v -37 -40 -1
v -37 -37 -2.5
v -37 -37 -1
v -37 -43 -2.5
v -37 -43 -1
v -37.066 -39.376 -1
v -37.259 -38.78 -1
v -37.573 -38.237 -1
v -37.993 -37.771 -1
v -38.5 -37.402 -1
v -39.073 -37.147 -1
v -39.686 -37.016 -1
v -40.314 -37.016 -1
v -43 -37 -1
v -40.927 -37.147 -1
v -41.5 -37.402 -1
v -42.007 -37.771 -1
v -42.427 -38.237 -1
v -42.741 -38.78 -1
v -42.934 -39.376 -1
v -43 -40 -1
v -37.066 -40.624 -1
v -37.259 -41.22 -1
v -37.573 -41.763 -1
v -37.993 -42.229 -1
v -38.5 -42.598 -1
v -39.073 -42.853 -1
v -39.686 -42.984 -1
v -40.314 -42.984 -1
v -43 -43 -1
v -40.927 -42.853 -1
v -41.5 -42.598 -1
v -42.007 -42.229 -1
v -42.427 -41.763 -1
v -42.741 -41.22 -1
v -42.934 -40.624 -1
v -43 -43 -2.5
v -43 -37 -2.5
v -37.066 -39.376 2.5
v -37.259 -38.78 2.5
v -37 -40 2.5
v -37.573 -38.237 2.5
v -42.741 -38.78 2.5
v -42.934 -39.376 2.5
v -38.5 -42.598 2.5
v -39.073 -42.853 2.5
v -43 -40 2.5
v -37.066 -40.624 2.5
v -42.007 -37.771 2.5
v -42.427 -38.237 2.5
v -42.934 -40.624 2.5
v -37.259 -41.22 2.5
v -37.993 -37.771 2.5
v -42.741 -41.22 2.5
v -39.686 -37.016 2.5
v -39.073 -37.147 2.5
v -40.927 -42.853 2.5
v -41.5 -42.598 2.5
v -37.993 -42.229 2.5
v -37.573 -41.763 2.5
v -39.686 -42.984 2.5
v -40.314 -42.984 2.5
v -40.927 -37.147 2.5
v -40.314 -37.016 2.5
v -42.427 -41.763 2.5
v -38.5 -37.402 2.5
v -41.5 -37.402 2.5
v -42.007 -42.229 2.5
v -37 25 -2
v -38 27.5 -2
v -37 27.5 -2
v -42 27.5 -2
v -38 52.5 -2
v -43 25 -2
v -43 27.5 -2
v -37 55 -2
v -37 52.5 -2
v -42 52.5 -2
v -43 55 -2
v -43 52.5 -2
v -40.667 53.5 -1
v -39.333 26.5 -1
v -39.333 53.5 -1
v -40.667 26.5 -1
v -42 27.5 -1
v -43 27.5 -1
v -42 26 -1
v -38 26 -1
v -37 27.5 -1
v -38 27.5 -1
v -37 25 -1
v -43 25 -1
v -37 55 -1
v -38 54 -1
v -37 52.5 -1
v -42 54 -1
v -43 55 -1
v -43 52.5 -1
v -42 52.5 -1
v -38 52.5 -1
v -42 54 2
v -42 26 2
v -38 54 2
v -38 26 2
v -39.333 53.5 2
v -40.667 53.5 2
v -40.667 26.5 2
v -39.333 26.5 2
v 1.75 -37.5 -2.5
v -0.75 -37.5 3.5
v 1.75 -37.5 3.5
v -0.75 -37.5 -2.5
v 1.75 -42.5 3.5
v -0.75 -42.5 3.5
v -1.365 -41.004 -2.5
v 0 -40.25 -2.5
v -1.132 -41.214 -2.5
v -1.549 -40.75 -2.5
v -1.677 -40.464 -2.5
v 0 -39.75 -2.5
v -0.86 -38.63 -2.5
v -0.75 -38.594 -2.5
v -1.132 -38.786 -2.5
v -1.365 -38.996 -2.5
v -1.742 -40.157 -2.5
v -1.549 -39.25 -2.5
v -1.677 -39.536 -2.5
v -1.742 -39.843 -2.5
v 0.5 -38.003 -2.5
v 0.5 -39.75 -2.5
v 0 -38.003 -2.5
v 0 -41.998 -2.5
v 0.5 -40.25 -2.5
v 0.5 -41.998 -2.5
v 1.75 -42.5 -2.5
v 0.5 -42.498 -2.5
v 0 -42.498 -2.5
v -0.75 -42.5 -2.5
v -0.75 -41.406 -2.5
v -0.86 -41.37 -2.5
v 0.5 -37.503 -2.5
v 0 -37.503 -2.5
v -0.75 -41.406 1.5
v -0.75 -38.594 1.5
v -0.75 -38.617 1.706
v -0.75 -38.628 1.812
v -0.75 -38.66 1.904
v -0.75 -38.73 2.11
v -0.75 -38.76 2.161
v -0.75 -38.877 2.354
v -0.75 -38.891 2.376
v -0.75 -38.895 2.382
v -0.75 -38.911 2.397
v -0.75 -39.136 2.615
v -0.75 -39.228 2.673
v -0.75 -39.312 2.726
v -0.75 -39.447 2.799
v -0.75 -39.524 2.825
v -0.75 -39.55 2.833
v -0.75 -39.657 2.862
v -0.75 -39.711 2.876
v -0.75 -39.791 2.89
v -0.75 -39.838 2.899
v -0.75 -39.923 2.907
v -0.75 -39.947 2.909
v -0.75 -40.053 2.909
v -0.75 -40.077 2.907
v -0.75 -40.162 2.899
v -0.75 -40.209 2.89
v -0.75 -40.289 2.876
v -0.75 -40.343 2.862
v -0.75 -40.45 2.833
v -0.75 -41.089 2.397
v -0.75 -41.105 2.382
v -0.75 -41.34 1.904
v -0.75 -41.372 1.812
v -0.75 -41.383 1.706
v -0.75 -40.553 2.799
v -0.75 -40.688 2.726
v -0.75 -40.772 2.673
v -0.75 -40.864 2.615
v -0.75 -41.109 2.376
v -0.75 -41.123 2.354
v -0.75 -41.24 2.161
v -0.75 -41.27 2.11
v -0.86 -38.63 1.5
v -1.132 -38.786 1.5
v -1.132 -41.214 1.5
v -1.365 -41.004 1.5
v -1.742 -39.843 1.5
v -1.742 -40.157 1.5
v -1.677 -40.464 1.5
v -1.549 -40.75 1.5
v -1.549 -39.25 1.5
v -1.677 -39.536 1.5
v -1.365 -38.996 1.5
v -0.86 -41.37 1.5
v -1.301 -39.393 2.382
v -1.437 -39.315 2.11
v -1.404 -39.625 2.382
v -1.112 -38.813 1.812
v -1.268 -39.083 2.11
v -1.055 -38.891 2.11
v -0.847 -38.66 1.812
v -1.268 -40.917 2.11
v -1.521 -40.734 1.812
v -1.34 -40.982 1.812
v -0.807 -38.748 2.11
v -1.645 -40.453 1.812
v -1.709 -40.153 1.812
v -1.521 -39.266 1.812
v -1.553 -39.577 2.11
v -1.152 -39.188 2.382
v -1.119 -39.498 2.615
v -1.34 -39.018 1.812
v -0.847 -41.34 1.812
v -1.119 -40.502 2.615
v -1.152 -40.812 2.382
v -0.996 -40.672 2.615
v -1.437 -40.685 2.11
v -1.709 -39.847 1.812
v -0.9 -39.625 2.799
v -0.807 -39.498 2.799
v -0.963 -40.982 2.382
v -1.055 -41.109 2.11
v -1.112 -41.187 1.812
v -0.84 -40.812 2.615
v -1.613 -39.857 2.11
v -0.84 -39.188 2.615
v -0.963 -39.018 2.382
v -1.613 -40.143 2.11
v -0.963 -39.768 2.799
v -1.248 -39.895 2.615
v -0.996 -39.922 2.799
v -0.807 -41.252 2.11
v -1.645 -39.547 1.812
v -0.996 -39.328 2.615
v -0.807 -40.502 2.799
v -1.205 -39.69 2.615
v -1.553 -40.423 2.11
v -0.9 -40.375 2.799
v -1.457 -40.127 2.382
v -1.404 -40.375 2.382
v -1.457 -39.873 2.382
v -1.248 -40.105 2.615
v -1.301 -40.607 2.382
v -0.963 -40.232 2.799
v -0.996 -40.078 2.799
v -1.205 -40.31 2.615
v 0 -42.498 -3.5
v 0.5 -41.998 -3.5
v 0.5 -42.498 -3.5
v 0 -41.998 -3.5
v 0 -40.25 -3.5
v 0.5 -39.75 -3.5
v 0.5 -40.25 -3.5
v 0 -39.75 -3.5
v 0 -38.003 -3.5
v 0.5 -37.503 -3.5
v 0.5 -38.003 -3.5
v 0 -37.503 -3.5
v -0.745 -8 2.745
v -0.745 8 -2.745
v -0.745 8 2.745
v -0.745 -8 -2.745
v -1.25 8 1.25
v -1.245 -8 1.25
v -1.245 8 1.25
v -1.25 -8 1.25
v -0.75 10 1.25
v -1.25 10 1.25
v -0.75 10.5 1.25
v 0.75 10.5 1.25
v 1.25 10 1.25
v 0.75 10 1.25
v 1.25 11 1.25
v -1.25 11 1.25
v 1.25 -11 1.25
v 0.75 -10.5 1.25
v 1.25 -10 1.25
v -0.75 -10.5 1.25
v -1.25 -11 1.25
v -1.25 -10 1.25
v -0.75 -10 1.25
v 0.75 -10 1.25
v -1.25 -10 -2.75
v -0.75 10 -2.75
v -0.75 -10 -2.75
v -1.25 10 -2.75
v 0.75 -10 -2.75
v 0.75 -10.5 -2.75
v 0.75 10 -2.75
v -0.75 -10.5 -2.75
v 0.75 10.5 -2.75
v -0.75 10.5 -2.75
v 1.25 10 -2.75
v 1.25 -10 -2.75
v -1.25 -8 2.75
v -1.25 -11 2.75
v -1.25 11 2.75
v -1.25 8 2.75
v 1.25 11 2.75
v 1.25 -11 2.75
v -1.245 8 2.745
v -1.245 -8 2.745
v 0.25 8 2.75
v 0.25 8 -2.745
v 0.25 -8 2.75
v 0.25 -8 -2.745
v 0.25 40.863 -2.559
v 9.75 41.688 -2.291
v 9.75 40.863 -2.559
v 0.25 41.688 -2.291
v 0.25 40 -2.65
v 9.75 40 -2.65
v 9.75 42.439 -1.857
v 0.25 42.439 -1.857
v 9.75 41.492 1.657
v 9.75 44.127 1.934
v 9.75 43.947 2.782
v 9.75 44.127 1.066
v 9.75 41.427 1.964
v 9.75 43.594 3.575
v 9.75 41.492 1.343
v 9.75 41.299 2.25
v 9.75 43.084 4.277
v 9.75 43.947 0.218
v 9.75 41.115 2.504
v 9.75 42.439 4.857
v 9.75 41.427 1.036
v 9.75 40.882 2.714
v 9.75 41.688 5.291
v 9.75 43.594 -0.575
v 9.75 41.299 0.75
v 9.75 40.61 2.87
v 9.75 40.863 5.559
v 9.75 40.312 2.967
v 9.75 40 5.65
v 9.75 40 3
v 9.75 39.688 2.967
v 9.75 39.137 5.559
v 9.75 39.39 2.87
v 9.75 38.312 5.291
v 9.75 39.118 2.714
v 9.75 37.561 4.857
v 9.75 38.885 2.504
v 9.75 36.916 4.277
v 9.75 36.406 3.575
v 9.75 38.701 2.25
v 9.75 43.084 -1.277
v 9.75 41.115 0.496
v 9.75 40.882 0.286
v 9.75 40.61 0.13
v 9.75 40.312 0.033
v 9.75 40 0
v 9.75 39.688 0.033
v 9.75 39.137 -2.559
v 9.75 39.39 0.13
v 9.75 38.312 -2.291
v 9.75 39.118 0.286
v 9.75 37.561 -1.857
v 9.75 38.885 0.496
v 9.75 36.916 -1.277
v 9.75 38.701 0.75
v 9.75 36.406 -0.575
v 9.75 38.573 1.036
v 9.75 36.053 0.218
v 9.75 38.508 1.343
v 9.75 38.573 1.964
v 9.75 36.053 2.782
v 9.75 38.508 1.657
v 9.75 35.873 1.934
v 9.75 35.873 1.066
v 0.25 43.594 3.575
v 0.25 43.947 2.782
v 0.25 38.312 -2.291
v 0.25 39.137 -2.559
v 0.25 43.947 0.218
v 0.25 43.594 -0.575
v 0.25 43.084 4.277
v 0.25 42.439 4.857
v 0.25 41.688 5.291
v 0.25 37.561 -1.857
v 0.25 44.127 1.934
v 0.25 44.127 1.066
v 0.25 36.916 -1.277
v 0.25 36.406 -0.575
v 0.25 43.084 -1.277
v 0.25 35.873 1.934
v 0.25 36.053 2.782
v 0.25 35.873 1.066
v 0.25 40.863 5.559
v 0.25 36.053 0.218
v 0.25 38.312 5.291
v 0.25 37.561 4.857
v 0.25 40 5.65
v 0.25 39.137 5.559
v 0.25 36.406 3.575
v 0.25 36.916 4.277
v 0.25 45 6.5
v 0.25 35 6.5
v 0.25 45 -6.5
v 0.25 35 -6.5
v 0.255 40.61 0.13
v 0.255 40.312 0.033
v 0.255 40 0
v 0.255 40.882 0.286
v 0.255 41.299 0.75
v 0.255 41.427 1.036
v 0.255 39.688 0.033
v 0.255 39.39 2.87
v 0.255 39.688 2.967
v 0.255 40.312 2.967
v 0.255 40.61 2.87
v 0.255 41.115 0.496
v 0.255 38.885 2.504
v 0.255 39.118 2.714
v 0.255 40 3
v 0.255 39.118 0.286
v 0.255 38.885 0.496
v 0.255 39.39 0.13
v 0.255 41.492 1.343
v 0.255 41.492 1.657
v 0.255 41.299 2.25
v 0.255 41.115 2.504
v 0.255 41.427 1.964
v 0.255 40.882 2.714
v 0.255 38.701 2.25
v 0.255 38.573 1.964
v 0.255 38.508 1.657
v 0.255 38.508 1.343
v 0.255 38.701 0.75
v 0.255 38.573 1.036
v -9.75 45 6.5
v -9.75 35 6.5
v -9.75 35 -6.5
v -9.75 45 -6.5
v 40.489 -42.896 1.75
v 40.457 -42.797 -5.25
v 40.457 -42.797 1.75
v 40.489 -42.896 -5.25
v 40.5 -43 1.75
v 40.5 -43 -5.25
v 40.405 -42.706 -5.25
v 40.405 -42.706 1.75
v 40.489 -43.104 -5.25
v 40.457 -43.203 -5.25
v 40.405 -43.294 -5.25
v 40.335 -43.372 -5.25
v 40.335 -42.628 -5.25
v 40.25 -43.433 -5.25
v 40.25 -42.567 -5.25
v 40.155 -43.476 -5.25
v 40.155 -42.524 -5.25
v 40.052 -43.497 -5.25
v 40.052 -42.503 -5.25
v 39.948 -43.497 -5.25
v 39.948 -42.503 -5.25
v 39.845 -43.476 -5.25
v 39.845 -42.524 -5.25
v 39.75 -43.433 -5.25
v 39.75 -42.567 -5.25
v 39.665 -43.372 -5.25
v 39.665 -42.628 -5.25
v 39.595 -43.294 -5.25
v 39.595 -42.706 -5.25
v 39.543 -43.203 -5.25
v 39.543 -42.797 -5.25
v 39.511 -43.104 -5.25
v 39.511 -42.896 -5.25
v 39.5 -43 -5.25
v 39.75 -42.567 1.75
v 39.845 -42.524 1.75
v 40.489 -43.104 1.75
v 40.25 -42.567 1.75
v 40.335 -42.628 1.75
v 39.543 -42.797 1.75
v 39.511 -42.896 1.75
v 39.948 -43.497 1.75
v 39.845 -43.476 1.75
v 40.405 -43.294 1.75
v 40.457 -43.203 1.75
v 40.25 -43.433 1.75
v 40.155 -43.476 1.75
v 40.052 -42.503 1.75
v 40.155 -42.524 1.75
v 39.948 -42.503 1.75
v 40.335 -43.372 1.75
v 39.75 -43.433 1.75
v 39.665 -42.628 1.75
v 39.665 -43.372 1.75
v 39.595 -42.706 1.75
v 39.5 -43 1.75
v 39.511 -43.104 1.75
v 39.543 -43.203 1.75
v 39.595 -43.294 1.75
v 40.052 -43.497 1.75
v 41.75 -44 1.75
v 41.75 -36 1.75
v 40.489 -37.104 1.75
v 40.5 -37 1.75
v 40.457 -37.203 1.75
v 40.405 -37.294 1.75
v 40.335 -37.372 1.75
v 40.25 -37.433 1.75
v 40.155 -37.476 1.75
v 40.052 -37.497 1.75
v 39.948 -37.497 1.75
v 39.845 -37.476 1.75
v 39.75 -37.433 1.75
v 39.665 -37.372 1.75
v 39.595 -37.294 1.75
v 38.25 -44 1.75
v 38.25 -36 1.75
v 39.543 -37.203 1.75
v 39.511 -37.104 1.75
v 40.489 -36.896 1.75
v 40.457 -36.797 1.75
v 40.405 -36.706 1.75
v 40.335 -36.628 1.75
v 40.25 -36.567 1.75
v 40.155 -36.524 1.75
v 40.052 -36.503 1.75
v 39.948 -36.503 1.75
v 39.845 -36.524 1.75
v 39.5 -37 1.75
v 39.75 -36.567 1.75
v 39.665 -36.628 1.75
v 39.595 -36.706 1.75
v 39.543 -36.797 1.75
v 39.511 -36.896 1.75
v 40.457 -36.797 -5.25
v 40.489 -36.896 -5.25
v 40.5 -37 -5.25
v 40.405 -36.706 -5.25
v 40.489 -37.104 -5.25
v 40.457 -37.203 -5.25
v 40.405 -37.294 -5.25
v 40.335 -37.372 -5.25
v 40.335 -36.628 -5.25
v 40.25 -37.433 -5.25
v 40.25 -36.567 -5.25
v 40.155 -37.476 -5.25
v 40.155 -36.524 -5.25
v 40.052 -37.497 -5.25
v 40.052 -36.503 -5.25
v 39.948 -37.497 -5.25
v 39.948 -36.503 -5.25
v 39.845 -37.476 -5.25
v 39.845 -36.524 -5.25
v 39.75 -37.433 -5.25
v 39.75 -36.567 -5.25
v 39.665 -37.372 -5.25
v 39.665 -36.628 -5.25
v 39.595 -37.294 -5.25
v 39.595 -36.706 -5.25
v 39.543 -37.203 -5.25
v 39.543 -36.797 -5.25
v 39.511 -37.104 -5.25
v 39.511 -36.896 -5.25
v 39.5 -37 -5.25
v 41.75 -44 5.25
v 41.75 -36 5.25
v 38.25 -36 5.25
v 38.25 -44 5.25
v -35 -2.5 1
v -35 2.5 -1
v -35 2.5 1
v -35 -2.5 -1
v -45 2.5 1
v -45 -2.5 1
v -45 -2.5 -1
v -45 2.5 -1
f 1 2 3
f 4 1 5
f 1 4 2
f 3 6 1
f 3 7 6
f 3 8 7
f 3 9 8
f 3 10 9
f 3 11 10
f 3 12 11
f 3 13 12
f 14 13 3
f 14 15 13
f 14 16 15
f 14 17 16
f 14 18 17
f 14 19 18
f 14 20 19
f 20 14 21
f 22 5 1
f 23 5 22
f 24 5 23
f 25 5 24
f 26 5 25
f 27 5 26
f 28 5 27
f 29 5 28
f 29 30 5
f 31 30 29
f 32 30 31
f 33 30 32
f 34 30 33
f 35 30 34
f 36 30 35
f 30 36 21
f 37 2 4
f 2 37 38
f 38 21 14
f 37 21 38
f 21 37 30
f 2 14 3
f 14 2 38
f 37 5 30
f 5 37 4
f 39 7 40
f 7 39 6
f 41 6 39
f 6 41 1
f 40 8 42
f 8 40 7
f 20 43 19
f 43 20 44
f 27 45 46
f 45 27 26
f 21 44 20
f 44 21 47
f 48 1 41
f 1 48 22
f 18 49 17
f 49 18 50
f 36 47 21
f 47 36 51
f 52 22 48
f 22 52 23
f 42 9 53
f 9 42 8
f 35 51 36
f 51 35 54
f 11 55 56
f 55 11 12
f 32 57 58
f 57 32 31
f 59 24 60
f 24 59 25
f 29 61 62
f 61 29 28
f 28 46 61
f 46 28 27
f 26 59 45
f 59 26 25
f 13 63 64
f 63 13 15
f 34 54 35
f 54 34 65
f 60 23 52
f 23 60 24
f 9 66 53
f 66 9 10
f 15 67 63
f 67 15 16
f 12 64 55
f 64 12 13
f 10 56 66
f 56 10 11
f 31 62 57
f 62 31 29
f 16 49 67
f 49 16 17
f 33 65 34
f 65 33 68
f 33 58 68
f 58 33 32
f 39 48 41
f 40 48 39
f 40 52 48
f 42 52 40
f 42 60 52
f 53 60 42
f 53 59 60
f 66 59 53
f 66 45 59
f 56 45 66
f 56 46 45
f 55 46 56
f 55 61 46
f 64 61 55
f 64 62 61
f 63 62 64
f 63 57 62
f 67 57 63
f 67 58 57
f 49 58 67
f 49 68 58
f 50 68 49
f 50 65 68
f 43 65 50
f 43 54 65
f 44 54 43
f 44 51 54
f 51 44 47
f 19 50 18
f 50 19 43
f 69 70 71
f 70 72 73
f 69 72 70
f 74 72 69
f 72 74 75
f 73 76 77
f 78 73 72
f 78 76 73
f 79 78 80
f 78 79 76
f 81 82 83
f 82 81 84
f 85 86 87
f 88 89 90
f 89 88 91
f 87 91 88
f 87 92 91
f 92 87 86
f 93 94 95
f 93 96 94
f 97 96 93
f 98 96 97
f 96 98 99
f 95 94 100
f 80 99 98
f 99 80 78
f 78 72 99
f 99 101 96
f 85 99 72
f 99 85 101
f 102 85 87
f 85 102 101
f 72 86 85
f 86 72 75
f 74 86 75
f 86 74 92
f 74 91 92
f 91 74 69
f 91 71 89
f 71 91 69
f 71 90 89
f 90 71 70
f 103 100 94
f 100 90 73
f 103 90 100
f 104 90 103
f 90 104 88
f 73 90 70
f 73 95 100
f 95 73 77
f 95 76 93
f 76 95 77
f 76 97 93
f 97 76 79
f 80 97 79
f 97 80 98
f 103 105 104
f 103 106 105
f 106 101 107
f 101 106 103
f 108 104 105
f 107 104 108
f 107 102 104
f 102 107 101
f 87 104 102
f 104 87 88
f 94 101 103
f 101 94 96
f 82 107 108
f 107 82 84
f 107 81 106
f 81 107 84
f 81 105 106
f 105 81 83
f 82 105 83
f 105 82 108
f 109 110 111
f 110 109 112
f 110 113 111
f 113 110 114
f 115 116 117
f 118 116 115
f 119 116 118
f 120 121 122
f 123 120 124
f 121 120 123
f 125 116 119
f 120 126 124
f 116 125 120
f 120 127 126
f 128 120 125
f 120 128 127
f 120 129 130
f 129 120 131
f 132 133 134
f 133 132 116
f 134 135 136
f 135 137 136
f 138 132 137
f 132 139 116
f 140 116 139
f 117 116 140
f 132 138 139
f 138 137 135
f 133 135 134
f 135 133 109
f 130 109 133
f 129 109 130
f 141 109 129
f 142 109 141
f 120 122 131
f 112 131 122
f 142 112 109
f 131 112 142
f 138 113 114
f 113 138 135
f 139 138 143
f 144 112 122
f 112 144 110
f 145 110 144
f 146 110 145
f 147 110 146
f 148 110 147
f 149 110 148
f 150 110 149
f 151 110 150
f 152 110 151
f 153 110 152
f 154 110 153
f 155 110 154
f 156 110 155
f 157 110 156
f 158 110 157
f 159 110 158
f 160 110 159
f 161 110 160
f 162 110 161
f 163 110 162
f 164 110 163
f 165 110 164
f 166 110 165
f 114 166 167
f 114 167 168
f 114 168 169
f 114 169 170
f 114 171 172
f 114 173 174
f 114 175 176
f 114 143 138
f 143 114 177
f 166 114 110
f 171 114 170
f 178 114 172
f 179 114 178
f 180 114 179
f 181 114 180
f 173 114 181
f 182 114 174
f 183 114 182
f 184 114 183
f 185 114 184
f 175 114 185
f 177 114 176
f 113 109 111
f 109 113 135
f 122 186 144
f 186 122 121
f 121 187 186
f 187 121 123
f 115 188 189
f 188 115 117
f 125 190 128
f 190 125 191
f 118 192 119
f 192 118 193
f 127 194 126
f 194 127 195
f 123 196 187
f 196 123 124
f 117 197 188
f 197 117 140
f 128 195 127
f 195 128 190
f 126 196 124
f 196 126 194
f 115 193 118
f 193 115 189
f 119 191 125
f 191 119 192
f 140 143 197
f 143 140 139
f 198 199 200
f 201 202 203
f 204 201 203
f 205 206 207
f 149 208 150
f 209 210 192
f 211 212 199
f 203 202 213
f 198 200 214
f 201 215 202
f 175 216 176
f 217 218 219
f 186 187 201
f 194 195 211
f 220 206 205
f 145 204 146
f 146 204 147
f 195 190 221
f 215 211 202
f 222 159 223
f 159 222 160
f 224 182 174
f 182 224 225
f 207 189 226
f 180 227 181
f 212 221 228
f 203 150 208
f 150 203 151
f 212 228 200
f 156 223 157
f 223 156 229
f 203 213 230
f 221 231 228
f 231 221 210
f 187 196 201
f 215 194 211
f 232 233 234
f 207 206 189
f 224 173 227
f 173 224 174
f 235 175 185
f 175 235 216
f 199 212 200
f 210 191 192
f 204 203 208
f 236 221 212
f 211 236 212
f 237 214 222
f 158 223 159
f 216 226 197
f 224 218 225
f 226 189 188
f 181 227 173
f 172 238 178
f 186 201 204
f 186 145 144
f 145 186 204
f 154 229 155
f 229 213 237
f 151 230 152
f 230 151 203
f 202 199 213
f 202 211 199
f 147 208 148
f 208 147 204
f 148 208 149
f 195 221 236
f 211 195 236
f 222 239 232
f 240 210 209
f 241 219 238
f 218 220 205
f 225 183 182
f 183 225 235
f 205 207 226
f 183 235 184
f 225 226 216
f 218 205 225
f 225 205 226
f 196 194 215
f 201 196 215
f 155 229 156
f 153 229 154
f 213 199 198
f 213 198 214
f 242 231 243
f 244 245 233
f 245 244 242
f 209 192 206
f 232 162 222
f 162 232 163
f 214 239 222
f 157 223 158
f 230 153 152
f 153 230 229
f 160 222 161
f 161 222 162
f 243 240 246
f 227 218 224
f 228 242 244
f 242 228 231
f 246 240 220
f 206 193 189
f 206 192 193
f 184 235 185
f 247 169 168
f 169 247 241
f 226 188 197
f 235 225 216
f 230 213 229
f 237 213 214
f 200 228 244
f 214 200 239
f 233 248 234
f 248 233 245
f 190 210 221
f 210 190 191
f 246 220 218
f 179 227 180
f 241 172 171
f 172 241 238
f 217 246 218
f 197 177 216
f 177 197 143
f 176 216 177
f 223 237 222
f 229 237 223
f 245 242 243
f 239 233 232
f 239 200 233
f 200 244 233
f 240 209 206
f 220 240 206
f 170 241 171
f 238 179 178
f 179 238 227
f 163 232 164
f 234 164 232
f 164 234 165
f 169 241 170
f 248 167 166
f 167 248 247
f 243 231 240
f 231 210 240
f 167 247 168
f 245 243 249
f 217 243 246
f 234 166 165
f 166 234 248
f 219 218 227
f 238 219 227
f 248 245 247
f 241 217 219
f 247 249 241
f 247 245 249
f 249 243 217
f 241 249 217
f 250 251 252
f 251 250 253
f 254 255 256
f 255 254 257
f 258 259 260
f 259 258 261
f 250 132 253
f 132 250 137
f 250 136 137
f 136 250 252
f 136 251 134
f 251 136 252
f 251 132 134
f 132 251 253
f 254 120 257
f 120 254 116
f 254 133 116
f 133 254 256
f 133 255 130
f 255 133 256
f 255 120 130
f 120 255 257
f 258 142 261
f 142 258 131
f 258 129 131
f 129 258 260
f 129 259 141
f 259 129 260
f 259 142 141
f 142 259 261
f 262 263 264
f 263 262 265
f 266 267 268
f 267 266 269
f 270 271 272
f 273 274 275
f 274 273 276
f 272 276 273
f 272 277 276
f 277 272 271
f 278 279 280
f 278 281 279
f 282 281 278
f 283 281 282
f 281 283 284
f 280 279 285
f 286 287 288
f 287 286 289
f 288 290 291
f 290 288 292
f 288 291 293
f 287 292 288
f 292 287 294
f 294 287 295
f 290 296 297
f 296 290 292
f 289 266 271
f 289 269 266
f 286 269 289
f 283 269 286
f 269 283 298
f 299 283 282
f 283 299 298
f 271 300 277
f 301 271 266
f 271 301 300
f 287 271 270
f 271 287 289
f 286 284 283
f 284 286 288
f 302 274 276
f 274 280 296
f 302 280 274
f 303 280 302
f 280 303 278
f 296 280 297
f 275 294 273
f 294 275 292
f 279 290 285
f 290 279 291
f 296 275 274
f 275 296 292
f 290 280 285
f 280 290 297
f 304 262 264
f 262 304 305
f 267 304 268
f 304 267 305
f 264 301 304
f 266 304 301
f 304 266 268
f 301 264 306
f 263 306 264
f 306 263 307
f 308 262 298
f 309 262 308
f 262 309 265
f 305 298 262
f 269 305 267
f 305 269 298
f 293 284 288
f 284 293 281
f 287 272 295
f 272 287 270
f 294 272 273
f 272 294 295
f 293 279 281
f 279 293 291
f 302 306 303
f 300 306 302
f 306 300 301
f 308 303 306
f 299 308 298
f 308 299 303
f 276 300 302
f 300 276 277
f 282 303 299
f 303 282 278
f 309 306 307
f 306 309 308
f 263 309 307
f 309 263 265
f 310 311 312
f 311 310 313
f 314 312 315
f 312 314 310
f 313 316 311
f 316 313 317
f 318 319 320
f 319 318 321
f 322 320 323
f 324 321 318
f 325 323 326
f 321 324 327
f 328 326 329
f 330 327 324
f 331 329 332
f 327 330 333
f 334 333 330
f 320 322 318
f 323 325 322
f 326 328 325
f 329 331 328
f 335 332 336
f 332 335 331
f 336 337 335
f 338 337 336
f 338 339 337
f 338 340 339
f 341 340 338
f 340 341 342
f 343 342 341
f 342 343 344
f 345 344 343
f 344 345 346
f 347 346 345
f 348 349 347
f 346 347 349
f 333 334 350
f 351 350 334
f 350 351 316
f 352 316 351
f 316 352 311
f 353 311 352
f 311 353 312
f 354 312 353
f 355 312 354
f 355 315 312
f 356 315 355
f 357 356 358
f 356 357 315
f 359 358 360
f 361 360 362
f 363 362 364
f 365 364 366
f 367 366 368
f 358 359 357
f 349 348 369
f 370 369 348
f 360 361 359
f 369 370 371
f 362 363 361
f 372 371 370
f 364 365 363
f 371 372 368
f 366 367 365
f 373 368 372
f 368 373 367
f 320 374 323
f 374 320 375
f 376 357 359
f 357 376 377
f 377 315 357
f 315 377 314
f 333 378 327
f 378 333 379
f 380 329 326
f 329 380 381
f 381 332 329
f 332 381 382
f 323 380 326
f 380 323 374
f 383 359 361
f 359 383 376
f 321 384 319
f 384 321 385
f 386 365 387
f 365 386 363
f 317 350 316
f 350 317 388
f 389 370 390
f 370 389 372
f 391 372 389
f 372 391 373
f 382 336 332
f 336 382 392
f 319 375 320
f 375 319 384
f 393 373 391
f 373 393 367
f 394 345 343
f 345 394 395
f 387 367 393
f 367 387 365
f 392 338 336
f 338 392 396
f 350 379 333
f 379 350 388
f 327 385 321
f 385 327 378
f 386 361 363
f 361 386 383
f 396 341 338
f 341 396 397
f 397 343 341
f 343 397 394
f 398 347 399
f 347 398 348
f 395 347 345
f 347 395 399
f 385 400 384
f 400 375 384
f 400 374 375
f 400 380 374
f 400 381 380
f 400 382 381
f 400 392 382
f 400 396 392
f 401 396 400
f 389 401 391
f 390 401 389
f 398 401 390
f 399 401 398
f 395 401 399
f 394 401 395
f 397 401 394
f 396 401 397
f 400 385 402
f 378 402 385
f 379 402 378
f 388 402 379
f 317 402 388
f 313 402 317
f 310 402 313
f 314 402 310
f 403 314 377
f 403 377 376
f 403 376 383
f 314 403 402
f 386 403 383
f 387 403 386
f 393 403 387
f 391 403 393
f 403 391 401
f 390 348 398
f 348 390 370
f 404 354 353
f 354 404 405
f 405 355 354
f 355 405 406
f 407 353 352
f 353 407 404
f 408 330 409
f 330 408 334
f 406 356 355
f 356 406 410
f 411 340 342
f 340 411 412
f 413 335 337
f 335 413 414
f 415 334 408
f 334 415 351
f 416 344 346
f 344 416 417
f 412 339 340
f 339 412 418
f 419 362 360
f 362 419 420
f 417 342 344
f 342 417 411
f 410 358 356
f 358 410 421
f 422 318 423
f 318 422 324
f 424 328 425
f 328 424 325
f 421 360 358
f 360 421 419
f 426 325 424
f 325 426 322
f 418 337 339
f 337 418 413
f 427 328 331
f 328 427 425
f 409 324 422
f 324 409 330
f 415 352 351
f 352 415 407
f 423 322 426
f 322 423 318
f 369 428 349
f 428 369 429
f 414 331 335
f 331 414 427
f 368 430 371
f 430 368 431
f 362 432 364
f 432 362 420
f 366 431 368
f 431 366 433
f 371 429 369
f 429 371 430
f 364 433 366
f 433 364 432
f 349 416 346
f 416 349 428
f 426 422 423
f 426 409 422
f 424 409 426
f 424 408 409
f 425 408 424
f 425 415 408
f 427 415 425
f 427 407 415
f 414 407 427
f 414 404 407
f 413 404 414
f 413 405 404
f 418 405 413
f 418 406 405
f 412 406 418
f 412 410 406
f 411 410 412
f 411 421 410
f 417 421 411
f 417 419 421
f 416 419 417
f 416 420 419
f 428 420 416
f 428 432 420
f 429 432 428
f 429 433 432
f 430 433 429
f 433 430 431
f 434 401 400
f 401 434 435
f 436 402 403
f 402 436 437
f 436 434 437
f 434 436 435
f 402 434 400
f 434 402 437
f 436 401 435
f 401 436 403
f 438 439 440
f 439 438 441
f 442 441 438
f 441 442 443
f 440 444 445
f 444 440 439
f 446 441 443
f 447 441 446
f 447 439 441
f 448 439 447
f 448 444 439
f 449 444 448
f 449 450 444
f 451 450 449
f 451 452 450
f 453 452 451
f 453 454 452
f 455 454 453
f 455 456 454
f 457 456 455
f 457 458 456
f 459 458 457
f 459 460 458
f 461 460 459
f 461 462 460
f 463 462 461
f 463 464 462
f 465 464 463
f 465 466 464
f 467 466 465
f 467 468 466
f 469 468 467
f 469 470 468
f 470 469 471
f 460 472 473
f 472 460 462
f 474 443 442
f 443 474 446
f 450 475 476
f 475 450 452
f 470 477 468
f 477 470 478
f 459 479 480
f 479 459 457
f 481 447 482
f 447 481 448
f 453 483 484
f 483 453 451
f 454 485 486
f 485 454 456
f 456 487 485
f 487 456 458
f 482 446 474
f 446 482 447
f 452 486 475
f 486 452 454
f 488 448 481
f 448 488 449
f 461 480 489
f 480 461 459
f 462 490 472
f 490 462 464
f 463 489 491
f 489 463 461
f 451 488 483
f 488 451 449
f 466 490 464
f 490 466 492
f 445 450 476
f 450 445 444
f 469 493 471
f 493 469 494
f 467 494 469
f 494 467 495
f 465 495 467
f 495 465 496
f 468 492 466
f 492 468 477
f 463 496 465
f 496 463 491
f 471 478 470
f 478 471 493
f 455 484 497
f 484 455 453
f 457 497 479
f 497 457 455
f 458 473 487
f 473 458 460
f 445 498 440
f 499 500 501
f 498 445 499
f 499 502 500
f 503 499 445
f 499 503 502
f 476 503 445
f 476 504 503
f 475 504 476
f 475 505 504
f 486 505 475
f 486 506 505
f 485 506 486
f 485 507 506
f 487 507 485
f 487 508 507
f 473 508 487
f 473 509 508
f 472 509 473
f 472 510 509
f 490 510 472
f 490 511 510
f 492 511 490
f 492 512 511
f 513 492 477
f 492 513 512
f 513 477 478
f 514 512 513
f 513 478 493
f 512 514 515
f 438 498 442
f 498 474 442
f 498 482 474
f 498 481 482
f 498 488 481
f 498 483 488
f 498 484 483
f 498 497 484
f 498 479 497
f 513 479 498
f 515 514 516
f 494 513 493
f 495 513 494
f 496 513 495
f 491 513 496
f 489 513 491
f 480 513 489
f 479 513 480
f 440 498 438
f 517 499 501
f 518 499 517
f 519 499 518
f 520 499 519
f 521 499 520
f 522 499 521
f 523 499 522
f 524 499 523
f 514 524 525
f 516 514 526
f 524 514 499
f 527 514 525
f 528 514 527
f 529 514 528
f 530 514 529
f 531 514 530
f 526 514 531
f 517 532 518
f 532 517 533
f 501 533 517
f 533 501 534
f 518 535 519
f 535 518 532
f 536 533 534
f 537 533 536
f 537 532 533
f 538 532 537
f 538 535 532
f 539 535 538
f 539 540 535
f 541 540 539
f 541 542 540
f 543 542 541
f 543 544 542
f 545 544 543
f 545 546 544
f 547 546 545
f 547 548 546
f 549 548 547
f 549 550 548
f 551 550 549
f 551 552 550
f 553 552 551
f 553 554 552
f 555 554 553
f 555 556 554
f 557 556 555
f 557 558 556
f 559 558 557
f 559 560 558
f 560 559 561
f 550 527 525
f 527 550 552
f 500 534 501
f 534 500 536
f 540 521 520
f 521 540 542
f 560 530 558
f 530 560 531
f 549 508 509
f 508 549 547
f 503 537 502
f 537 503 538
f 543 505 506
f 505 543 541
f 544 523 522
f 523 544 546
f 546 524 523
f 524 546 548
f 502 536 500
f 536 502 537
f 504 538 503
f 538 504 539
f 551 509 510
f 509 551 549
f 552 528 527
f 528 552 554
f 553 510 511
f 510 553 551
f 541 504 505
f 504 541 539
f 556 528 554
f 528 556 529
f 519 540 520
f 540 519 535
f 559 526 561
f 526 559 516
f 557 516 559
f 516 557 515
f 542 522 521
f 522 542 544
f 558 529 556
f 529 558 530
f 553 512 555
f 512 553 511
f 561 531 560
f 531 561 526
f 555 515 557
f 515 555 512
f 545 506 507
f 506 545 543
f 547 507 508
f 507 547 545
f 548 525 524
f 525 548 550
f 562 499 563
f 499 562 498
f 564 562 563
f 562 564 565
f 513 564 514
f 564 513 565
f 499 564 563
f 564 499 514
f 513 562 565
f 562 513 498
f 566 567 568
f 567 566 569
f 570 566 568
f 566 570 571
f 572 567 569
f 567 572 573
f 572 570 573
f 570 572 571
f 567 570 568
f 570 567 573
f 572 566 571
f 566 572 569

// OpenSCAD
// file: ../globals.scad
// Copyright (c) 2017 Clément Bœsch <u pkh.me>
//
// Permission to use, copy, modify, and distribute this software for any
// purpose with or without fee is hereby granted, provided that the above
// copyright notice and this permission notice appear in all copies.
//
// THE SOFTWARE IS PROVIDED "AS IS" AND THE AUTHOR DISCLAIMS ALL WARRANTIES
// WITH REGARD TO THIS SOFTWARE INCLUDING ALL IMPLIED WARRANTIES OF
// MERCHANTABILITY AND FITNESS. IN NO EVENT SHALL THE AUTHOR BE LIABLE FOR
// ANY SPECIAL, DIRECT, INDIRECT, OR CONSEQUENTIAL DAMAGES OR ANY DAMAGES
// WHATSOEVER RESULTING FROM LOSS OF USE, DATA OR PROFITS, WHETHER IN AN
// ACTION OF CONTRACT, NEGLIGENCE OR OTHER TORTIOUS ACTION, ARISING OUT OF
// OR IN CONNECTION WITH THE USE OR PERFORMANCE OF THIS SOFTWARE.

$fn = 30;

_delta = 0.005;

c_black        = [.17,.17,.17];
c_black_redish = [.35,.30,.30];
c_gold         = [.75,.55,.00];
c_gray         = [.40,.40,.40];
c_darkgray     = [.25,.25,.25];
c_green_pcb    = [.00,.50,.25];
c_metal        = [.70,.70,.70];
c_yellow       = [.70,.70,.30];
c_darkblue     = [.20,.30,.40];
c_blue         = [.35,.50,.90];
// file: _internal.scad
// Copyright (c) 2017 Clément Bœsch <u pkh.me>
//
// Permission to use, copy, modify, and distribute this software for any
// purpose with or without fee is hereby granted, provided that the above
// copyright notice and this permission notice appear in all copies.
//
// THE SOFTWARE IS PROVIDED "AS IS" AND THE AUTHOR DISCLAIMS ALL WARRANTIES
// WITH REGARD TO THIS SOFTWARE INCLUDING ALL IMPLIED WARRANTIES OF
// MERCHANTABILITY AND FITNESS. IN NO EVENT SHALL THE AUTHOR BE LIABLE FOR
// ANY SPECIAL, DIRECT, INDIRECT, OR CONSEQUENTIAL DAMAGES OR ANY DAMAGES
// WHATSOEVER RESULTING FROM LOSS OF USE, DATA OR PROFITS, WHETHER IN AN
// ACTION OF CONTRACT, NEGLIGENCE OR OTHER TORTIOUS ACTION, ARISING OUT OF
// OR IN CONNECTION WITH THE USE OR PERFORMANCE OF THIS SOFTWARE.

include <../globals.scad>

$vpr = [50, 0, 90];

module components_demo(pad=30) {
    n = $children;
    cols = ceil(sqrt(n));
    rows = ceil(n / cols);
    offx = pad * (rows - 1) / 2;
    offy = pad * (cols - 1) / 2;
    for (i = [0:n-1]) {
        x = floor(i / cols);
        y = i % cols;
        translate([x*pad - offx, y*pad - offy])
            rotate(360 * $t)
                children(i);
    }
}
// main file
// Copyright (c) 2017 Clément Bœsch <u pkh.me>
//
// Permission to use, copy, modify, and distribute this software for any
// purpose with or without fee is hereby granted, provided that the above
// copyright notice and this permission notice appear in all copies.
//
// THE SOFTWARE IS PROVIDED "AS IS" AND THE AUTHOR DISCLAIMS ALL WARRANTIES
// WITH REGARD TO THIS SOFTWARE INCLUDING ALL IMPLIED WARRANTIES OF
// MERCHANTABILITY AND FITNESS. IN NO EVENT SHALL THE AUTHOR BE LIABLE FOR
// ANY SPECIAL, DIRECT, INDIRECT, OR CONSEQUENTIAL DAMAGES OR ANY DAMAGES
// WHATSOEVER RESULTING FROM LOSS OF USE, DATA OR PROFITS, WHETHER IN AN
// ACTION OF CONTRACT, NEGLIGENCE OR OTHER TORTIOUS ACTION, ARISING OUT OF
// OR IN CONNECTION WITH THE USE OR PERFORMANCE OF THIS SOFTWARE.

include <_internal.scad>

$vpd = 350;

module capacitor(dim=[6, 6, 5]) {
    l = dim[0];
    w = dim[1];
    h = dim[2];
    translate(dim * -.5) {
        color(c_black)
            cube([l, w, 1.5]);
        color(c_metal)
            translate([l/2, w/2, 1.5])
            cylinder(d=l, h=h-1.5);
    }
}

module chip(dim=[10, 5, 2]) { // TODO
    color(c_black)
        cube(dim, center=true);
}

module extio_hikey(dim=[6, 30, 4]) {
    l = dim[1];
    w = dim[0];
    h = dim[2];
    rotate([0, 0, 90]) translate([dim[1], dim[0], dim[2]] * -.5) // XXX
    color([.9,.85,.75]) {
        linear_extrude(height=1) {
            square([2.5, w]);
            translate([l-2.5, 0])
                square([2.5, w]);
            translate([0, (w-4)/2])
                square([l, 4]);
        }
        translate([0, 0, 1]) {
            linear_extrude(height=h-1) {
                difference() {
                    translate([1, (w-4)/2])
                        square([l-2, 4]);
                    translate([1.5, (w-4/3)/2])
                        square([l-3, 4/3]);
                }
            }
        }
    }
}

module ir(dim=[3.5, 5, 7]) {
    l = dim[1];
    w = dim[0];
    h = dim[2];
    rotate([0, 0, 90]) translate([dim[1], dim[0], dim[2]] * -.5) { // XXX
    color(c_black) {
        translate([0, 0, 1])
            cube([l, w-1, h-1]);
        translate([l/2, w-1.5, 1])
            cylinder(r=1.5, h=h-3);
        translate([l/2, w-1.5, h-2])
            sphere(r=1.5);
    }
    color(c_metal)
        linear_extrude(height=h/2)
            for (i = [0:2])
                translate([i*(l-.5-_delta)/2 + _delta/2, (w-1)/2])
                    square(.5);
    }
}

module plug(dim=[20, 10, 15], clr=c_black,
            cyl_d=3, cyl_l=5, cyl_hole_d=2, cyl_clr=c_metal,
            top_pad=0) {

    l = dim[0];
    w = dim[1];
    h = dim[2];

    cube_l = l - cyl_l;

    color(clr)
        translate([-cyl_l/2, 0, 0])
            cube([cube_l, w, h], center=true);
    color(cyl_clr) {
        translate([(l-cyl_l)/2, 0, (h-cyl_d)/2 - top_pad]) {
            rotate([0, 90, 0]) {
                difference() {
                    cylinder(d=cyl_d, h=cyl_l, center=true);
                    translate([0, 0, _delta])
                        cylinder(d=3.0, h=cyl_l, center=true);
                }
            }
        }
    }
}

module rca(dim=[19.5, 10, 13]) {
    plug(dim, clr=c_yellow,
         cyl_d=8.3, cyl_l=9.5, cyl_hole_d=3.0, cyl_clr=c_metal, top_pad=0.85);
}

module rt_bbb(dim=[3.5, 8, 10.5]) {
    rt1_l = dim[0];
    rt1_w = dim[1];
    rt1_h = dim[2];

    head_l = dim[0];
    head_w = dim[1];
    head_h = dim[2] / 3;

    translate(dim * -.5) { // XXX
        color(c_metal)
            for (y = [1, rt1_w-1])
                translate([rt1_l/2, y])
                    cylinder(d=1, h=rt1_h-head_h);

        color(c_gold)
            translate([0, 0, rt1_h-head_h])
                cube([head_l, head_w, head_h]);
    }
}

module serialcon_rpi(dim=[2.5, 22, 5.5]) {
    l = dim[0];
    w = dim[1];
    h = dim[2];
    translate(dim * -.5) { // XXX
        color([.9,.85,.75]) {
            translate([0, 1])
                cube([.5+_delta, w-2, h-1.5]);
            translate([l-.5, 1])
                cube([.5, w-2, h-1.5]);
            translate([_delta, 3, h-1.5])
                cube([0.5, w-3*2, 1.5-_delta]);
        }
        color(c_black) {
            difference() {
                union() {
                    translate([.5, 0.5, 0])
                        cube([l-1, w-1, h-1.5+_delta]);
                    translate([0, 0, h-1.5])
                        cube([l, w, 1.5]);
                }
                translate([-_delta, 3, _delta])
                    cube([l-1+_delta, w-3*2, h]);
            }
        }
    }
}

function capacitor_info() = [
    ["category", "misc"],
    ["watch", "nowhere"],
];

function chip_info() = [
    ["category", "misc"],
    ["watch", "nowhere"],
];

function extio_hikey_info() = [
    ["category", "misc"],
    ["watch", "sky"],
];

function ir_info() = [
    ["category", "misc"],
    ["watch", "nowhere"],
];

function rca_info() = [
    ["category", "misc"],
    ["watch", "horizon"],
];

function rt_bbb_info() = [
    ["category", "misc"],
    ["watch", "nowhere"],
];

function serialcon_rpi_info() = [
    ["category", "misc"],
    ["watch", "sky"],
];

components_demo(pad=40) {
    capacitor();
    chip();
    extio_hikey();
    ir();
    serialcon_rpi();
    rca();
    rt_bbb();
}
